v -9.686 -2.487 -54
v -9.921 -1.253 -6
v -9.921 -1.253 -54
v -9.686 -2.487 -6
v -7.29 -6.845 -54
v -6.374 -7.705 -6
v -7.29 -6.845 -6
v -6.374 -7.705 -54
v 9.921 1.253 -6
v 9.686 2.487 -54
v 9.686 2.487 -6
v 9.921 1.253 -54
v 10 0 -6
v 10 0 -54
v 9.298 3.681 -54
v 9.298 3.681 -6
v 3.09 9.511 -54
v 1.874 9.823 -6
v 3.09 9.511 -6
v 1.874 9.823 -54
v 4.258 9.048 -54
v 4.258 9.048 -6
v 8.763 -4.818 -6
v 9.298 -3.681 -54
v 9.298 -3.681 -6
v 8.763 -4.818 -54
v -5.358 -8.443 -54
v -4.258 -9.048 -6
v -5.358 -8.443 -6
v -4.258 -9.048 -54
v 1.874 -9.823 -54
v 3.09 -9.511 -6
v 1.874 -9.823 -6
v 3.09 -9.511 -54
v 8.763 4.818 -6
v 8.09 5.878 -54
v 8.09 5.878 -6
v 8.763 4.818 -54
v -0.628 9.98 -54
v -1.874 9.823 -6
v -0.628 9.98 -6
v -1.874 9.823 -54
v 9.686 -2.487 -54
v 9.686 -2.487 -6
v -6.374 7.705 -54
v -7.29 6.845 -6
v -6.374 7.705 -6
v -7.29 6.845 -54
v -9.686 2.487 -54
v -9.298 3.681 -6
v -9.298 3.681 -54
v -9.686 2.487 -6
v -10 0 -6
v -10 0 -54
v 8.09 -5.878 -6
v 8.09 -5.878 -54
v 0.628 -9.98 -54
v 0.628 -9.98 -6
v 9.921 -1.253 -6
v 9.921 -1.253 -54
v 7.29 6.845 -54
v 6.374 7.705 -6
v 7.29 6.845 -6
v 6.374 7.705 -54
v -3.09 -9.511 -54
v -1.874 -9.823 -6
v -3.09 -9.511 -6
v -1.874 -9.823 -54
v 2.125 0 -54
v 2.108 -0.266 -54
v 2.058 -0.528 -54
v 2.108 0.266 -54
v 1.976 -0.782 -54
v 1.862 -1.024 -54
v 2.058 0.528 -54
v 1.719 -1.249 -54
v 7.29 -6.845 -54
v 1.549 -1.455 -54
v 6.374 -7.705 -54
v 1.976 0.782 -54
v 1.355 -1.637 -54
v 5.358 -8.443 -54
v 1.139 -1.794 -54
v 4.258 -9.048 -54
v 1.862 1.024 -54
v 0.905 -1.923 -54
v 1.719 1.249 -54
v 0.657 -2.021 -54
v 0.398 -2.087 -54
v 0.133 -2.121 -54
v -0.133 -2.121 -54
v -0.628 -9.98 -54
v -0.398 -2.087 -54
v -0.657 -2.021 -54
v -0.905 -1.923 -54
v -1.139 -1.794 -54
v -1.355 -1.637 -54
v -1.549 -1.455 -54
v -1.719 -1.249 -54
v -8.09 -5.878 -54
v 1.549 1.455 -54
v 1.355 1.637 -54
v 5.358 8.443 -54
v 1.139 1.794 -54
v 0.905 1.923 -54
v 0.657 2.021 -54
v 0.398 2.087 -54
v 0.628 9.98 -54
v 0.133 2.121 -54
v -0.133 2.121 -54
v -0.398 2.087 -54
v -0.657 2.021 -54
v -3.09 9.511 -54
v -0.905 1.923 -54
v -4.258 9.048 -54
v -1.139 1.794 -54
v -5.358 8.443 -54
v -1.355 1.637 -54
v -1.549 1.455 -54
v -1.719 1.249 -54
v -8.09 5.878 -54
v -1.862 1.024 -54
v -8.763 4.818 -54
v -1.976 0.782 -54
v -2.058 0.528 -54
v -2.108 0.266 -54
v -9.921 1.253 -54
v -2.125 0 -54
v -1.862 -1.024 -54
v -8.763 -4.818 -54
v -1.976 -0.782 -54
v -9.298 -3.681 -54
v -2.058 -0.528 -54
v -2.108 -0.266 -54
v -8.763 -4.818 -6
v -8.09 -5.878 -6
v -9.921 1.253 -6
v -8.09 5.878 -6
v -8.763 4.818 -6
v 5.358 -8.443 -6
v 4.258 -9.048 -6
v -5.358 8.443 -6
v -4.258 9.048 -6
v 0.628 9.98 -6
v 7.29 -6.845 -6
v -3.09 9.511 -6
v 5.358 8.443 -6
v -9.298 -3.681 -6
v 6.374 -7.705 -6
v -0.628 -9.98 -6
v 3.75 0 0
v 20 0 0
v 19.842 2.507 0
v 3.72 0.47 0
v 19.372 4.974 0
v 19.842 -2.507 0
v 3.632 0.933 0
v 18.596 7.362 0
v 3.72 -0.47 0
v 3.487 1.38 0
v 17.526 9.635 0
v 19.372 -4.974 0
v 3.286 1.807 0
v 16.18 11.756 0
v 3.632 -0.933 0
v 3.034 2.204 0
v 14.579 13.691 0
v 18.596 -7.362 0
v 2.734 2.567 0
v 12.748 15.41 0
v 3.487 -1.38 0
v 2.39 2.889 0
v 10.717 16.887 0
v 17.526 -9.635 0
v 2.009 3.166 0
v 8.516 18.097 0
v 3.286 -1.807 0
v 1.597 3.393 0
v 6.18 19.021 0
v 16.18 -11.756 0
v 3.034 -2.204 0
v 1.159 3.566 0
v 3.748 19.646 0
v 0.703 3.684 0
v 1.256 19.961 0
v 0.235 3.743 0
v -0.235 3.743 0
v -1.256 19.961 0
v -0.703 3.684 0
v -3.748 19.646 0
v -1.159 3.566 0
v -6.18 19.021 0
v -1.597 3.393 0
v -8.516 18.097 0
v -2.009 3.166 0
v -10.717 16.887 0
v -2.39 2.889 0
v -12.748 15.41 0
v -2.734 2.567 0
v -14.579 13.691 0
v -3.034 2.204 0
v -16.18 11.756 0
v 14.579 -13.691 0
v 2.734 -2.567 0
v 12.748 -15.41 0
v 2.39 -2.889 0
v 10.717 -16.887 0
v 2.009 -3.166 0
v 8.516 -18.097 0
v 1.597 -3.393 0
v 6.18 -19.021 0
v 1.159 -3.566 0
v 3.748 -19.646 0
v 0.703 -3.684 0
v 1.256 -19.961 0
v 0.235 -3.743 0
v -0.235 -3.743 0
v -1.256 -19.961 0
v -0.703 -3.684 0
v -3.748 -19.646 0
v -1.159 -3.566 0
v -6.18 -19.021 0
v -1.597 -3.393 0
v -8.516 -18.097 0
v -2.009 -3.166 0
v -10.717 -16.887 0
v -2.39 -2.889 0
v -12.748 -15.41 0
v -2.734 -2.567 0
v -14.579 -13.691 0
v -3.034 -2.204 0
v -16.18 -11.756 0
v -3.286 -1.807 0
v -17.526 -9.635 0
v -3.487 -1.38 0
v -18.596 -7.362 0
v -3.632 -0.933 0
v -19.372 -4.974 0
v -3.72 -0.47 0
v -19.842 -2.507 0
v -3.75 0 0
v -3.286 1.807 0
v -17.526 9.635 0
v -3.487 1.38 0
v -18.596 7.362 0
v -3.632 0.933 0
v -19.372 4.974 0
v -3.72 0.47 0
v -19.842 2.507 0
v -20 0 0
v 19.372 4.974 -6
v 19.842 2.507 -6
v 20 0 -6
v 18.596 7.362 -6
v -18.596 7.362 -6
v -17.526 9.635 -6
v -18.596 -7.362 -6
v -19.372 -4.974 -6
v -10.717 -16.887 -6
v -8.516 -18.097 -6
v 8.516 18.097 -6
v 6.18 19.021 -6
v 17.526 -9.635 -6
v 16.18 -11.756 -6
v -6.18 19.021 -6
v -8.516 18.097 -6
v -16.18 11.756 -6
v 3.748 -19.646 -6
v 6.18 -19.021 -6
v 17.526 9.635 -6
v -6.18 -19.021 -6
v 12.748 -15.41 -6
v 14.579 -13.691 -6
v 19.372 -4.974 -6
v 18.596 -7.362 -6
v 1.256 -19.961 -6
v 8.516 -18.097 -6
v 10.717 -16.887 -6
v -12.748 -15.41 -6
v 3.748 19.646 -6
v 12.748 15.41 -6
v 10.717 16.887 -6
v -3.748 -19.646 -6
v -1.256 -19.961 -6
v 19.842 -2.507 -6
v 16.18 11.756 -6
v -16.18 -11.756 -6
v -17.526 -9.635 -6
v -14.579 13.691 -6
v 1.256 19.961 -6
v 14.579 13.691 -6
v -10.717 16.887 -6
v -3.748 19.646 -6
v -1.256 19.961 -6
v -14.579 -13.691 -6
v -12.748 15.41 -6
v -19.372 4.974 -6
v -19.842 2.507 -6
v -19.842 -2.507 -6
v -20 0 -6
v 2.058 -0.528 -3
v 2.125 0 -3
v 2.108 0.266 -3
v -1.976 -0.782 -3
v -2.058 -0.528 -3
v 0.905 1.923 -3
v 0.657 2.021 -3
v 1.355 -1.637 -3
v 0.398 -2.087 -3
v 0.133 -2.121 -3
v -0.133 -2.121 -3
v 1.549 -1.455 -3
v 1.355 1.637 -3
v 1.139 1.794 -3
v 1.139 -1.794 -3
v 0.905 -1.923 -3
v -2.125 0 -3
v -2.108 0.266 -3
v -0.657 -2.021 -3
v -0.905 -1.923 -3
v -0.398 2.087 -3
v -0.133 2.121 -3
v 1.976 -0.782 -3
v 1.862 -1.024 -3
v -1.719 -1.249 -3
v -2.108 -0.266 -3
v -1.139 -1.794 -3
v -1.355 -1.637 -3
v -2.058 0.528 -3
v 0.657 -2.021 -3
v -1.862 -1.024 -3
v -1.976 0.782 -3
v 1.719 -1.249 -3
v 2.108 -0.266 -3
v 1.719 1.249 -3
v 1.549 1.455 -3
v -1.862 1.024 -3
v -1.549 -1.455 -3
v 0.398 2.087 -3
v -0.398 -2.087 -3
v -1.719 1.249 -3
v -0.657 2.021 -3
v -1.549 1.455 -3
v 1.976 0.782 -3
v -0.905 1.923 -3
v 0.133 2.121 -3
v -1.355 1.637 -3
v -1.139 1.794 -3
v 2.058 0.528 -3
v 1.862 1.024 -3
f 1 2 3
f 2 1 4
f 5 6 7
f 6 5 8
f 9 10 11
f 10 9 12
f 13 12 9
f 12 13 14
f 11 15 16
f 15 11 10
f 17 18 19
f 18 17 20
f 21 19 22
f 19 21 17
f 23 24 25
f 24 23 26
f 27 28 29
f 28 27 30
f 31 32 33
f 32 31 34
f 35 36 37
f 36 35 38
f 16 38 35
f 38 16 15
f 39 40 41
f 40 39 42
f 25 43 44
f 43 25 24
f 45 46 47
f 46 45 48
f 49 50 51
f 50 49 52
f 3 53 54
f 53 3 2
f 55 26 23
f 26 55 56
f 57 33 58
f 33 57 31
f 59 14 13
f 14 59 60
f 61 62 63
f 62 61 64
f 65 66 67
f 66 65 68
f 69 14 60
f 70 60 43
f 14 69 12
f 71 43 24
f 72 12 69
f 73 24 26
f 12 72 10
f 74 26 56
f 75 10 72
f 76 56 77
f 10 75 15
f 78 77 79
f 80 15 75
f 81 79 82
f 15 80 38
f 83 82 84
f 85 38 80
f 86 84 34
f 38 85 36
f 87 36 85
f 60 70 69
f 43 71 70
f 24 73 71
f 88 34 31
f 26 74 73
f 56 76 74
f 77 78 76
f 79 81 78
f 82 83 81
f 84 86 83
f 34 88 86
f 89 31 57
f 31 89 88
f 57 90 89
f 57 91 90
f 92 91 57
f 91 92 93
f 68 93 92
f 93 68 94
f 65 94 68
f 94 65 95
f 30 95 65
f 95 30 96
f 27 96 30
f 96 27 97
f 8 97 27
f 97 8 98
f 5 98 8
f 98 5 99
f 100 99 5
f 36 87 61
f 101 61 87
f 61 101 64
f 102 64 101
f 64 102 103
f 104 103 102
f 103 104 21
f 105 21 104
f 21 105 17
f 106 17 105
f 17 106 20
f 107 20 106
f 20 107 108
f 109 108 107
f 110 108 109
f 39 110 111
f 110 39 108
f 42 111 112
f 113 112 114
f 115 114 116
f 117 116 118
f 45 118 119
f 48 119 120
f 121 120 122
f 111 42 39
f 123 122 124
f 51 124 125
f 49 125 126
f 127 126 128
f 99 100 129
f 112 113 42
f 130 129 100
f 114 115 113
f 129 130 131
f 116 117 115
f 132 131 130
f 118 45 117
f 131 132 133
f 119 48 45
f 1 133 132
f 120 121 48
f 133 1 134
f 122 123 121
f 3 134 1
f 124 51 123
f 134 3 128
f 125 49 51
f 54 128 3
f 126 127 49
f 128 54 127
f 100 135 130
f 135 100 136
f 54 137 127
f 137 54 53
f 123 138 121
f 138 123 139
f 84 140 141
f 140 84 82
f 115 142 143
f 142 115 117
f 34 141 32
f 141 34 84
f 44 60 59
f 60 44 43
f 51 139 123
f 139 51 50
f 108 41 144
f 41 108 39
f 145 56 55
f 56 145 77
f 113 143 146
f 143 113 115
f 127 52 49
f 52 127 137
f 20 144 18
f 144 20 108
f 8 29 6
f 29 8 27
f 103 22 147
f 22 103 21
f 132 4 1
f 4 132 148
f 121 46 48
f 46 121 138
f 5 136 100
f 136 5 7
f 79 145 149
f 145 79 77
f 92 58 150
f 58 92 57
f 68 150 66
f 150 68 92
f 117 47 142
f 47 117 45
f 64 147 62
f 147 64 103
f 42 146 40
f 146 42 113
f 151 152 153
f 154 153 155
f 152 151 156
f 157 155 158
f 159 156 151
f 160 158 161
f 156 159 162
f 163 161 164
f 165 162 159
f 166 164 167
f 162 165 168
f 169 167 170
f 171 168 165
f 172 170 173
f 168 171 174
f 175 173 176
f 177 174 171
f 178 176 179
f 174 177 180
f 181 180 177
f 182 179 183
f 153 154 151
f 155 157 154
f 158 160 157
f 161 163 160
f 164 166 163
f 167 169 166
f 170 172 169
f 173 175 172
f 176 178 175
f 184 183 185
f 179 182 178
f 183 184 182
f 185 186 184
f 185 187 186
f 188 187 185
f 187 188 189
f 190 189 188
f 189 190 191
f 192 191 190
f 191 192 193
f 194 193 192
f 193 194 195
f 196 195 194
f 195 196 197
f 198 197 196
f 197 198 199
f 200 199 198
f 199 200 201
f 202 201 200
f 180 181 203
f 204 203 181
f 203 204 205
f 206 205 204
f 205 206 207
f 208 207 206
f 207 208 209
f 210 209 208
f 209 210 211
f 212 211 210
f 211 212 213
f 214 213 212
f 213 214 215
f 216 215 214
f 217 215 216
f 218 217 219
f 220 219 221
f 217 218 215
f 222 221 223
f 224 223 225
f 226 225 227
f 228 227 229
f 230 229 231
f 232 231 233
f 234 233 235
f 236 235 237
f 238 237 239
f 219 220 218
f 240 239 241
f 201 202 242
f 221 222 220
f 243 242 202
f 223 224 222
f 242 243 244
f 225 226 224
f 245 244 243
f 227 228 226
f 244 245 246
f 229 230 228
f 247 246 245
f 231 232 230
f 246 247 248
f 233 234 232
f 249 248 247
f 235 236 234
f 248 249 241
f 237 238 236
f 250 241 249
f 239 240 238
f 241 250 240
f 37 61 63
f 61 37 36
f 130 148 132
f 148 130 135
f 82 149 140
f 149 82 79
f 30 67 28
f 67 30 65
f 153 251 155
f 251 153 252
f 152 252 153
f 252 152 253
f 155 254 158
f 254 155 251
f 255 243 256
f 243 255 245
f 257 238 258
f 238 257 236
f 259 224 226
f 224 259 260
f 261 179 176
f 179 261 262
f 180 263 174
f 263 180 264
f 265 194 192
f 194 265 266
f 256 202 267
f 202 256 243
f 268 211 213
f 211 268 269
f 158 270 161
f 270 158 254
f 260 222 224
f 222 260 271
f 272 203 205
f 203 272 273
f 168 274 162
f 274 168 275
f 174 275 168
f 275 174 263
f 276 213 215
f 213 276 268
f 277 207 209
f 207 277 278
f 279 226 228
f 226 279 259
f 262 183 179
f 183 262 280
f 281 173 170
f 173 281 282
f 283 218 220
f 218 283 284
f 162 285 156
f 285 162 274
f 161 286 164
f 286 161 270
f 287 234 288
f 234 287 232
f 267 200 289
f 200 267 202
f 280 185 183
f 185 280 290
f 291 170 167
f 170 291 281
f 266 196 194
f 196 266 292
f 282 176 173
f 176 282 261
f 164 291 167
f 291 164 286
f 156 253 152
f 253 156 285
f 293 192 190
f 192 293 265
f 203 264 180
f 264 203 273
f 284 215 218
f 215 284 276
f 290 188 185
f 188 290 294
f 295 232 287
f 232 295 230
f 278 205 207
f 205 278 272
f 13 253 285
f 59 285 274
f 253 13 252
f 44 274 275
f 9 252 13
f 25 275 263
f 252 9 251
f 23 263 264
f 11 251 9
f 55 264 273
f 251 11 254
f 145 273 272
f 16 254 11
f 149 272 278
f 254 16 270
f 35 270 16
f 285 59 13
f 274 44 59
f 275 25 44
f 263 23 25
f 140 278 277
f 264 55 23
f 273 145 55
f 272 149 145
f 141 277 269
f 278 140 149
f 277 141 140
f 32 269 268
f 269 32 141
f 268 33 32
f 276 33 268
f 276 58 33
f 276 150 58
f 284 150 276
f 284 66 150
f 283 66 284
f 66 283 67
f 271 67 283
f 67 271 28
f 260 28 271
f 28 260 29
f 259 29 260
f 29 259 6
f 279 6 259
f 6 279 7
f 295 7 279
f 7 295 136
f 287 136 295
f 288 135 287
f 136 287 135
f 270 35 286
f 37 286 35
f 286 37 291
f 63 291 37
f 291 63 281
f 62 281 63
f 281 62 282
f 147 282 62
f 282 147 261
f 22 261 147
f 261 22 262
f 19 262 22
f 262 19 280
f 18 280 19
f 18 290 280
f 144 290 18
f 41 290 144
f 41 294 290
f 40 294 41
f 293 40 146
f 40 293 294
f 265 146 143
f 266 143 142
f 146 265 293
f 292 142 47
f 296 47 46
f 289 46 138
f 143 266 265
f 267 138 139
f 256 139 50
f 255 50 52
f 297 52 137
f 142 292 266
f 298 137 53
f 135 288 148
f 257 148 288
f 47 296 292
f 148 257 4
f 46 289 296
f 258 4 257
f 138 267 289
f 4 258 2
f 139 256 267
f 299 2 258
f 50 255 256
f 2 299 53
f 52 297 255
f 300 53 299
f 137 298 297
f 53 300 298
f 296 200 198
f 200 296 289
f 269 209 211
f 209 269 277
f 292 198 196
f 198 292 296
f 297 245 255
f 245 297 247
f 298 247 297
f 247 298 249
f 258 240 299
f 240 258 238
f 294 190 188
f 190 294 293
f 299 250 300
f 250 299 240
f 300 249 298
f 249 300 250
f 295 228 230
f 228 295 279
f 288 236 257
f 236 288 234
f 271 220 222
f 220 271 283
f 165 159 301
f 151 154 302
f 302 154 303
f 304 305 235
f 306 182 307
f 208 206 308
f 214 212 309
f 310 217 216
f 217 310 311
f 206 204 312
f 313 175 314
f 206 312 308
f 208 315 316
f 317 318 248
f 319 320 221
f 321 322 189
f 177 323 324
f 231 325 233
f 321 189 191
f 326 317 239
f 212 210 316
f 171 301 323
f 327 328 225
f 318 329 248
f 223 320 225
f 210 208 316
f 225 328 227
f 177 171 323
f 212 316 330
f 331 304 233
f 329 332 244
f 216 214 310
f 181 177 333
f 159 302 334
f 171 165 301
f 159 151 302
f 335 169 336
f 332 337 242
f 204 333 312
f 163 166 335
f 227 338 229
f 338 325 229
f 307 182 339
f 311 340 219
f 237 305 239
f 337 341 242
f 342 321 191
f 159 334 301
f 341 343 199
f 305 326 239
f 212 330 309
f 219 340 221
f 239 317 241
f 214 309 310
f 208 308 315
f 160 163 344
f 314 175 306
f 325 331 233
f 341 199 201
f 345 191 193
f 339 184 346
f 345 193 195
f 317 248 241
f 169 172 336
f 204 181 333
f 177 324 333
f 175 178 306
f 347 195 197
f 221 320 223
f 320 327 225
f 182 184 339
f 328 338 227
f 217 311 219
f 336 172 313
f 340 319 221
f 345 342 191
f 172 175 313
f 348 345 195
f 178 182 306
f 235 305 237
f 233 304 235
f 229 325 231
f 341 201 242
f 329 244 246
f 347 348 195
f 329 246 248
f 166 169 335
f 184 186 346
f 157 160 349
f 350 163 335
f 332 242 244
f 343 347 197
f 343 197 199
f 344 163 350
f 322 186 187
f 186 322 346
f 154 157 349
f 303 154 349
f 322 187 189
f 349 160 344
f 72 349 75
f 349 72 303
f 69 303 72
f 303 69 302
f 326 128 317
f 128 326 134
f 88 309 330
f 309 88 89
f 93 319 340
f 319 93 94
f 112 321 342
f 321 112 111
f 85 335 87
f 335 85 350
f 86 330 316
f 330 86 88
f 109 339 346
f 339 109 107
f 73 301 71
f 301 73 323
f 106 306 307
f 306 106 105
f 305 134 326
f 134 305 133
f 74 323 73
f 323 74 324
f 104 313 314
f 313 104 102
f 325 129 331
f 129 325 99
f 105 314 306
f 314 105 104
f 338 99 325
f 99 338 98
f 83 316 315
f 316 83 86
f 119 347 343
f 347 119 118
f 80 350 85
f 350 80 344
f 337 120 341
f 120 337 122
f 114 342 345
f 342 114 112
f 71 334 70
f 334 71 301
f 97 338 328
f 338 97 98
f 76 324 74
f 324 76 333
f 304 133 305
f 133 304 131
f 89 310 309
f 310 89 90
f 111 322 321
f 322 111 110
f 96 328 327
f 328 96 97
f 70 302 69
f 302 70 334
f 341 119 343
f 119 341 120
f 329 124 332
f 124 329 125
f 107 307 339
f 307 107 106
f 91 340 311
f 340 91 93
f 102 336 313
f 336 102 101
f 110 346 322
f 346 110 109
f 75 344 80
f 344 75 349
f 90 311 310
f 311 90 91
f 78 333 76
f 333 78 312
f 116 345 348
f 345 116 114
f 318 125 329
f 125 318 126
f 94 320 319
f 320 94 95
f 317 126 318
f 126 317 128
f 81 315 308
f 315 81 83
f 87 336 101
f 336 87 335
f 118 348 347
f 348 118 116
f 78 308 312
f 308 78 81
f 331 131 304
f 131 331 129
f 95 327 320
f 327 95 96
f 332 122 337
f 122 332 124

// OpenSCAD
$fn = 50;


difference() {
	union() {
		translate(v = [0, 0, -54.0000000000]) {
			cylinder(h = 54, r = 10.0000000000);
		}
		translate(v = [0, 0, -6.0000000000]) {
			cylinder(h = 6, r = 20.0000000000);
		}
	}
	union() {
		translate(v = [0, 0, 0]) {
			rotate(a = [0, 0, 0]) {
				difference() {
					union() {
						#translate(v = [0, 0, -54.0000000000]) {
							cylinder(h = 54, r = 2.0000000000);
						}
						#translate(v = [0, 0, -3]) {
							cylinder(h = 3, r1 = 2.1250000000, r2 = 3.7500000000);
						}
						#translate(v = [0, 0, -54.0000000000]) {
							cylinder(h = 54, r = 2.1250000000);
						}
						#translate(v = [0, 0, -54.0000000000]) {
							cylinder(h = 54, r = 2.0000000000);
						}
					}
					union();
				}
			}
		}
	}
}
